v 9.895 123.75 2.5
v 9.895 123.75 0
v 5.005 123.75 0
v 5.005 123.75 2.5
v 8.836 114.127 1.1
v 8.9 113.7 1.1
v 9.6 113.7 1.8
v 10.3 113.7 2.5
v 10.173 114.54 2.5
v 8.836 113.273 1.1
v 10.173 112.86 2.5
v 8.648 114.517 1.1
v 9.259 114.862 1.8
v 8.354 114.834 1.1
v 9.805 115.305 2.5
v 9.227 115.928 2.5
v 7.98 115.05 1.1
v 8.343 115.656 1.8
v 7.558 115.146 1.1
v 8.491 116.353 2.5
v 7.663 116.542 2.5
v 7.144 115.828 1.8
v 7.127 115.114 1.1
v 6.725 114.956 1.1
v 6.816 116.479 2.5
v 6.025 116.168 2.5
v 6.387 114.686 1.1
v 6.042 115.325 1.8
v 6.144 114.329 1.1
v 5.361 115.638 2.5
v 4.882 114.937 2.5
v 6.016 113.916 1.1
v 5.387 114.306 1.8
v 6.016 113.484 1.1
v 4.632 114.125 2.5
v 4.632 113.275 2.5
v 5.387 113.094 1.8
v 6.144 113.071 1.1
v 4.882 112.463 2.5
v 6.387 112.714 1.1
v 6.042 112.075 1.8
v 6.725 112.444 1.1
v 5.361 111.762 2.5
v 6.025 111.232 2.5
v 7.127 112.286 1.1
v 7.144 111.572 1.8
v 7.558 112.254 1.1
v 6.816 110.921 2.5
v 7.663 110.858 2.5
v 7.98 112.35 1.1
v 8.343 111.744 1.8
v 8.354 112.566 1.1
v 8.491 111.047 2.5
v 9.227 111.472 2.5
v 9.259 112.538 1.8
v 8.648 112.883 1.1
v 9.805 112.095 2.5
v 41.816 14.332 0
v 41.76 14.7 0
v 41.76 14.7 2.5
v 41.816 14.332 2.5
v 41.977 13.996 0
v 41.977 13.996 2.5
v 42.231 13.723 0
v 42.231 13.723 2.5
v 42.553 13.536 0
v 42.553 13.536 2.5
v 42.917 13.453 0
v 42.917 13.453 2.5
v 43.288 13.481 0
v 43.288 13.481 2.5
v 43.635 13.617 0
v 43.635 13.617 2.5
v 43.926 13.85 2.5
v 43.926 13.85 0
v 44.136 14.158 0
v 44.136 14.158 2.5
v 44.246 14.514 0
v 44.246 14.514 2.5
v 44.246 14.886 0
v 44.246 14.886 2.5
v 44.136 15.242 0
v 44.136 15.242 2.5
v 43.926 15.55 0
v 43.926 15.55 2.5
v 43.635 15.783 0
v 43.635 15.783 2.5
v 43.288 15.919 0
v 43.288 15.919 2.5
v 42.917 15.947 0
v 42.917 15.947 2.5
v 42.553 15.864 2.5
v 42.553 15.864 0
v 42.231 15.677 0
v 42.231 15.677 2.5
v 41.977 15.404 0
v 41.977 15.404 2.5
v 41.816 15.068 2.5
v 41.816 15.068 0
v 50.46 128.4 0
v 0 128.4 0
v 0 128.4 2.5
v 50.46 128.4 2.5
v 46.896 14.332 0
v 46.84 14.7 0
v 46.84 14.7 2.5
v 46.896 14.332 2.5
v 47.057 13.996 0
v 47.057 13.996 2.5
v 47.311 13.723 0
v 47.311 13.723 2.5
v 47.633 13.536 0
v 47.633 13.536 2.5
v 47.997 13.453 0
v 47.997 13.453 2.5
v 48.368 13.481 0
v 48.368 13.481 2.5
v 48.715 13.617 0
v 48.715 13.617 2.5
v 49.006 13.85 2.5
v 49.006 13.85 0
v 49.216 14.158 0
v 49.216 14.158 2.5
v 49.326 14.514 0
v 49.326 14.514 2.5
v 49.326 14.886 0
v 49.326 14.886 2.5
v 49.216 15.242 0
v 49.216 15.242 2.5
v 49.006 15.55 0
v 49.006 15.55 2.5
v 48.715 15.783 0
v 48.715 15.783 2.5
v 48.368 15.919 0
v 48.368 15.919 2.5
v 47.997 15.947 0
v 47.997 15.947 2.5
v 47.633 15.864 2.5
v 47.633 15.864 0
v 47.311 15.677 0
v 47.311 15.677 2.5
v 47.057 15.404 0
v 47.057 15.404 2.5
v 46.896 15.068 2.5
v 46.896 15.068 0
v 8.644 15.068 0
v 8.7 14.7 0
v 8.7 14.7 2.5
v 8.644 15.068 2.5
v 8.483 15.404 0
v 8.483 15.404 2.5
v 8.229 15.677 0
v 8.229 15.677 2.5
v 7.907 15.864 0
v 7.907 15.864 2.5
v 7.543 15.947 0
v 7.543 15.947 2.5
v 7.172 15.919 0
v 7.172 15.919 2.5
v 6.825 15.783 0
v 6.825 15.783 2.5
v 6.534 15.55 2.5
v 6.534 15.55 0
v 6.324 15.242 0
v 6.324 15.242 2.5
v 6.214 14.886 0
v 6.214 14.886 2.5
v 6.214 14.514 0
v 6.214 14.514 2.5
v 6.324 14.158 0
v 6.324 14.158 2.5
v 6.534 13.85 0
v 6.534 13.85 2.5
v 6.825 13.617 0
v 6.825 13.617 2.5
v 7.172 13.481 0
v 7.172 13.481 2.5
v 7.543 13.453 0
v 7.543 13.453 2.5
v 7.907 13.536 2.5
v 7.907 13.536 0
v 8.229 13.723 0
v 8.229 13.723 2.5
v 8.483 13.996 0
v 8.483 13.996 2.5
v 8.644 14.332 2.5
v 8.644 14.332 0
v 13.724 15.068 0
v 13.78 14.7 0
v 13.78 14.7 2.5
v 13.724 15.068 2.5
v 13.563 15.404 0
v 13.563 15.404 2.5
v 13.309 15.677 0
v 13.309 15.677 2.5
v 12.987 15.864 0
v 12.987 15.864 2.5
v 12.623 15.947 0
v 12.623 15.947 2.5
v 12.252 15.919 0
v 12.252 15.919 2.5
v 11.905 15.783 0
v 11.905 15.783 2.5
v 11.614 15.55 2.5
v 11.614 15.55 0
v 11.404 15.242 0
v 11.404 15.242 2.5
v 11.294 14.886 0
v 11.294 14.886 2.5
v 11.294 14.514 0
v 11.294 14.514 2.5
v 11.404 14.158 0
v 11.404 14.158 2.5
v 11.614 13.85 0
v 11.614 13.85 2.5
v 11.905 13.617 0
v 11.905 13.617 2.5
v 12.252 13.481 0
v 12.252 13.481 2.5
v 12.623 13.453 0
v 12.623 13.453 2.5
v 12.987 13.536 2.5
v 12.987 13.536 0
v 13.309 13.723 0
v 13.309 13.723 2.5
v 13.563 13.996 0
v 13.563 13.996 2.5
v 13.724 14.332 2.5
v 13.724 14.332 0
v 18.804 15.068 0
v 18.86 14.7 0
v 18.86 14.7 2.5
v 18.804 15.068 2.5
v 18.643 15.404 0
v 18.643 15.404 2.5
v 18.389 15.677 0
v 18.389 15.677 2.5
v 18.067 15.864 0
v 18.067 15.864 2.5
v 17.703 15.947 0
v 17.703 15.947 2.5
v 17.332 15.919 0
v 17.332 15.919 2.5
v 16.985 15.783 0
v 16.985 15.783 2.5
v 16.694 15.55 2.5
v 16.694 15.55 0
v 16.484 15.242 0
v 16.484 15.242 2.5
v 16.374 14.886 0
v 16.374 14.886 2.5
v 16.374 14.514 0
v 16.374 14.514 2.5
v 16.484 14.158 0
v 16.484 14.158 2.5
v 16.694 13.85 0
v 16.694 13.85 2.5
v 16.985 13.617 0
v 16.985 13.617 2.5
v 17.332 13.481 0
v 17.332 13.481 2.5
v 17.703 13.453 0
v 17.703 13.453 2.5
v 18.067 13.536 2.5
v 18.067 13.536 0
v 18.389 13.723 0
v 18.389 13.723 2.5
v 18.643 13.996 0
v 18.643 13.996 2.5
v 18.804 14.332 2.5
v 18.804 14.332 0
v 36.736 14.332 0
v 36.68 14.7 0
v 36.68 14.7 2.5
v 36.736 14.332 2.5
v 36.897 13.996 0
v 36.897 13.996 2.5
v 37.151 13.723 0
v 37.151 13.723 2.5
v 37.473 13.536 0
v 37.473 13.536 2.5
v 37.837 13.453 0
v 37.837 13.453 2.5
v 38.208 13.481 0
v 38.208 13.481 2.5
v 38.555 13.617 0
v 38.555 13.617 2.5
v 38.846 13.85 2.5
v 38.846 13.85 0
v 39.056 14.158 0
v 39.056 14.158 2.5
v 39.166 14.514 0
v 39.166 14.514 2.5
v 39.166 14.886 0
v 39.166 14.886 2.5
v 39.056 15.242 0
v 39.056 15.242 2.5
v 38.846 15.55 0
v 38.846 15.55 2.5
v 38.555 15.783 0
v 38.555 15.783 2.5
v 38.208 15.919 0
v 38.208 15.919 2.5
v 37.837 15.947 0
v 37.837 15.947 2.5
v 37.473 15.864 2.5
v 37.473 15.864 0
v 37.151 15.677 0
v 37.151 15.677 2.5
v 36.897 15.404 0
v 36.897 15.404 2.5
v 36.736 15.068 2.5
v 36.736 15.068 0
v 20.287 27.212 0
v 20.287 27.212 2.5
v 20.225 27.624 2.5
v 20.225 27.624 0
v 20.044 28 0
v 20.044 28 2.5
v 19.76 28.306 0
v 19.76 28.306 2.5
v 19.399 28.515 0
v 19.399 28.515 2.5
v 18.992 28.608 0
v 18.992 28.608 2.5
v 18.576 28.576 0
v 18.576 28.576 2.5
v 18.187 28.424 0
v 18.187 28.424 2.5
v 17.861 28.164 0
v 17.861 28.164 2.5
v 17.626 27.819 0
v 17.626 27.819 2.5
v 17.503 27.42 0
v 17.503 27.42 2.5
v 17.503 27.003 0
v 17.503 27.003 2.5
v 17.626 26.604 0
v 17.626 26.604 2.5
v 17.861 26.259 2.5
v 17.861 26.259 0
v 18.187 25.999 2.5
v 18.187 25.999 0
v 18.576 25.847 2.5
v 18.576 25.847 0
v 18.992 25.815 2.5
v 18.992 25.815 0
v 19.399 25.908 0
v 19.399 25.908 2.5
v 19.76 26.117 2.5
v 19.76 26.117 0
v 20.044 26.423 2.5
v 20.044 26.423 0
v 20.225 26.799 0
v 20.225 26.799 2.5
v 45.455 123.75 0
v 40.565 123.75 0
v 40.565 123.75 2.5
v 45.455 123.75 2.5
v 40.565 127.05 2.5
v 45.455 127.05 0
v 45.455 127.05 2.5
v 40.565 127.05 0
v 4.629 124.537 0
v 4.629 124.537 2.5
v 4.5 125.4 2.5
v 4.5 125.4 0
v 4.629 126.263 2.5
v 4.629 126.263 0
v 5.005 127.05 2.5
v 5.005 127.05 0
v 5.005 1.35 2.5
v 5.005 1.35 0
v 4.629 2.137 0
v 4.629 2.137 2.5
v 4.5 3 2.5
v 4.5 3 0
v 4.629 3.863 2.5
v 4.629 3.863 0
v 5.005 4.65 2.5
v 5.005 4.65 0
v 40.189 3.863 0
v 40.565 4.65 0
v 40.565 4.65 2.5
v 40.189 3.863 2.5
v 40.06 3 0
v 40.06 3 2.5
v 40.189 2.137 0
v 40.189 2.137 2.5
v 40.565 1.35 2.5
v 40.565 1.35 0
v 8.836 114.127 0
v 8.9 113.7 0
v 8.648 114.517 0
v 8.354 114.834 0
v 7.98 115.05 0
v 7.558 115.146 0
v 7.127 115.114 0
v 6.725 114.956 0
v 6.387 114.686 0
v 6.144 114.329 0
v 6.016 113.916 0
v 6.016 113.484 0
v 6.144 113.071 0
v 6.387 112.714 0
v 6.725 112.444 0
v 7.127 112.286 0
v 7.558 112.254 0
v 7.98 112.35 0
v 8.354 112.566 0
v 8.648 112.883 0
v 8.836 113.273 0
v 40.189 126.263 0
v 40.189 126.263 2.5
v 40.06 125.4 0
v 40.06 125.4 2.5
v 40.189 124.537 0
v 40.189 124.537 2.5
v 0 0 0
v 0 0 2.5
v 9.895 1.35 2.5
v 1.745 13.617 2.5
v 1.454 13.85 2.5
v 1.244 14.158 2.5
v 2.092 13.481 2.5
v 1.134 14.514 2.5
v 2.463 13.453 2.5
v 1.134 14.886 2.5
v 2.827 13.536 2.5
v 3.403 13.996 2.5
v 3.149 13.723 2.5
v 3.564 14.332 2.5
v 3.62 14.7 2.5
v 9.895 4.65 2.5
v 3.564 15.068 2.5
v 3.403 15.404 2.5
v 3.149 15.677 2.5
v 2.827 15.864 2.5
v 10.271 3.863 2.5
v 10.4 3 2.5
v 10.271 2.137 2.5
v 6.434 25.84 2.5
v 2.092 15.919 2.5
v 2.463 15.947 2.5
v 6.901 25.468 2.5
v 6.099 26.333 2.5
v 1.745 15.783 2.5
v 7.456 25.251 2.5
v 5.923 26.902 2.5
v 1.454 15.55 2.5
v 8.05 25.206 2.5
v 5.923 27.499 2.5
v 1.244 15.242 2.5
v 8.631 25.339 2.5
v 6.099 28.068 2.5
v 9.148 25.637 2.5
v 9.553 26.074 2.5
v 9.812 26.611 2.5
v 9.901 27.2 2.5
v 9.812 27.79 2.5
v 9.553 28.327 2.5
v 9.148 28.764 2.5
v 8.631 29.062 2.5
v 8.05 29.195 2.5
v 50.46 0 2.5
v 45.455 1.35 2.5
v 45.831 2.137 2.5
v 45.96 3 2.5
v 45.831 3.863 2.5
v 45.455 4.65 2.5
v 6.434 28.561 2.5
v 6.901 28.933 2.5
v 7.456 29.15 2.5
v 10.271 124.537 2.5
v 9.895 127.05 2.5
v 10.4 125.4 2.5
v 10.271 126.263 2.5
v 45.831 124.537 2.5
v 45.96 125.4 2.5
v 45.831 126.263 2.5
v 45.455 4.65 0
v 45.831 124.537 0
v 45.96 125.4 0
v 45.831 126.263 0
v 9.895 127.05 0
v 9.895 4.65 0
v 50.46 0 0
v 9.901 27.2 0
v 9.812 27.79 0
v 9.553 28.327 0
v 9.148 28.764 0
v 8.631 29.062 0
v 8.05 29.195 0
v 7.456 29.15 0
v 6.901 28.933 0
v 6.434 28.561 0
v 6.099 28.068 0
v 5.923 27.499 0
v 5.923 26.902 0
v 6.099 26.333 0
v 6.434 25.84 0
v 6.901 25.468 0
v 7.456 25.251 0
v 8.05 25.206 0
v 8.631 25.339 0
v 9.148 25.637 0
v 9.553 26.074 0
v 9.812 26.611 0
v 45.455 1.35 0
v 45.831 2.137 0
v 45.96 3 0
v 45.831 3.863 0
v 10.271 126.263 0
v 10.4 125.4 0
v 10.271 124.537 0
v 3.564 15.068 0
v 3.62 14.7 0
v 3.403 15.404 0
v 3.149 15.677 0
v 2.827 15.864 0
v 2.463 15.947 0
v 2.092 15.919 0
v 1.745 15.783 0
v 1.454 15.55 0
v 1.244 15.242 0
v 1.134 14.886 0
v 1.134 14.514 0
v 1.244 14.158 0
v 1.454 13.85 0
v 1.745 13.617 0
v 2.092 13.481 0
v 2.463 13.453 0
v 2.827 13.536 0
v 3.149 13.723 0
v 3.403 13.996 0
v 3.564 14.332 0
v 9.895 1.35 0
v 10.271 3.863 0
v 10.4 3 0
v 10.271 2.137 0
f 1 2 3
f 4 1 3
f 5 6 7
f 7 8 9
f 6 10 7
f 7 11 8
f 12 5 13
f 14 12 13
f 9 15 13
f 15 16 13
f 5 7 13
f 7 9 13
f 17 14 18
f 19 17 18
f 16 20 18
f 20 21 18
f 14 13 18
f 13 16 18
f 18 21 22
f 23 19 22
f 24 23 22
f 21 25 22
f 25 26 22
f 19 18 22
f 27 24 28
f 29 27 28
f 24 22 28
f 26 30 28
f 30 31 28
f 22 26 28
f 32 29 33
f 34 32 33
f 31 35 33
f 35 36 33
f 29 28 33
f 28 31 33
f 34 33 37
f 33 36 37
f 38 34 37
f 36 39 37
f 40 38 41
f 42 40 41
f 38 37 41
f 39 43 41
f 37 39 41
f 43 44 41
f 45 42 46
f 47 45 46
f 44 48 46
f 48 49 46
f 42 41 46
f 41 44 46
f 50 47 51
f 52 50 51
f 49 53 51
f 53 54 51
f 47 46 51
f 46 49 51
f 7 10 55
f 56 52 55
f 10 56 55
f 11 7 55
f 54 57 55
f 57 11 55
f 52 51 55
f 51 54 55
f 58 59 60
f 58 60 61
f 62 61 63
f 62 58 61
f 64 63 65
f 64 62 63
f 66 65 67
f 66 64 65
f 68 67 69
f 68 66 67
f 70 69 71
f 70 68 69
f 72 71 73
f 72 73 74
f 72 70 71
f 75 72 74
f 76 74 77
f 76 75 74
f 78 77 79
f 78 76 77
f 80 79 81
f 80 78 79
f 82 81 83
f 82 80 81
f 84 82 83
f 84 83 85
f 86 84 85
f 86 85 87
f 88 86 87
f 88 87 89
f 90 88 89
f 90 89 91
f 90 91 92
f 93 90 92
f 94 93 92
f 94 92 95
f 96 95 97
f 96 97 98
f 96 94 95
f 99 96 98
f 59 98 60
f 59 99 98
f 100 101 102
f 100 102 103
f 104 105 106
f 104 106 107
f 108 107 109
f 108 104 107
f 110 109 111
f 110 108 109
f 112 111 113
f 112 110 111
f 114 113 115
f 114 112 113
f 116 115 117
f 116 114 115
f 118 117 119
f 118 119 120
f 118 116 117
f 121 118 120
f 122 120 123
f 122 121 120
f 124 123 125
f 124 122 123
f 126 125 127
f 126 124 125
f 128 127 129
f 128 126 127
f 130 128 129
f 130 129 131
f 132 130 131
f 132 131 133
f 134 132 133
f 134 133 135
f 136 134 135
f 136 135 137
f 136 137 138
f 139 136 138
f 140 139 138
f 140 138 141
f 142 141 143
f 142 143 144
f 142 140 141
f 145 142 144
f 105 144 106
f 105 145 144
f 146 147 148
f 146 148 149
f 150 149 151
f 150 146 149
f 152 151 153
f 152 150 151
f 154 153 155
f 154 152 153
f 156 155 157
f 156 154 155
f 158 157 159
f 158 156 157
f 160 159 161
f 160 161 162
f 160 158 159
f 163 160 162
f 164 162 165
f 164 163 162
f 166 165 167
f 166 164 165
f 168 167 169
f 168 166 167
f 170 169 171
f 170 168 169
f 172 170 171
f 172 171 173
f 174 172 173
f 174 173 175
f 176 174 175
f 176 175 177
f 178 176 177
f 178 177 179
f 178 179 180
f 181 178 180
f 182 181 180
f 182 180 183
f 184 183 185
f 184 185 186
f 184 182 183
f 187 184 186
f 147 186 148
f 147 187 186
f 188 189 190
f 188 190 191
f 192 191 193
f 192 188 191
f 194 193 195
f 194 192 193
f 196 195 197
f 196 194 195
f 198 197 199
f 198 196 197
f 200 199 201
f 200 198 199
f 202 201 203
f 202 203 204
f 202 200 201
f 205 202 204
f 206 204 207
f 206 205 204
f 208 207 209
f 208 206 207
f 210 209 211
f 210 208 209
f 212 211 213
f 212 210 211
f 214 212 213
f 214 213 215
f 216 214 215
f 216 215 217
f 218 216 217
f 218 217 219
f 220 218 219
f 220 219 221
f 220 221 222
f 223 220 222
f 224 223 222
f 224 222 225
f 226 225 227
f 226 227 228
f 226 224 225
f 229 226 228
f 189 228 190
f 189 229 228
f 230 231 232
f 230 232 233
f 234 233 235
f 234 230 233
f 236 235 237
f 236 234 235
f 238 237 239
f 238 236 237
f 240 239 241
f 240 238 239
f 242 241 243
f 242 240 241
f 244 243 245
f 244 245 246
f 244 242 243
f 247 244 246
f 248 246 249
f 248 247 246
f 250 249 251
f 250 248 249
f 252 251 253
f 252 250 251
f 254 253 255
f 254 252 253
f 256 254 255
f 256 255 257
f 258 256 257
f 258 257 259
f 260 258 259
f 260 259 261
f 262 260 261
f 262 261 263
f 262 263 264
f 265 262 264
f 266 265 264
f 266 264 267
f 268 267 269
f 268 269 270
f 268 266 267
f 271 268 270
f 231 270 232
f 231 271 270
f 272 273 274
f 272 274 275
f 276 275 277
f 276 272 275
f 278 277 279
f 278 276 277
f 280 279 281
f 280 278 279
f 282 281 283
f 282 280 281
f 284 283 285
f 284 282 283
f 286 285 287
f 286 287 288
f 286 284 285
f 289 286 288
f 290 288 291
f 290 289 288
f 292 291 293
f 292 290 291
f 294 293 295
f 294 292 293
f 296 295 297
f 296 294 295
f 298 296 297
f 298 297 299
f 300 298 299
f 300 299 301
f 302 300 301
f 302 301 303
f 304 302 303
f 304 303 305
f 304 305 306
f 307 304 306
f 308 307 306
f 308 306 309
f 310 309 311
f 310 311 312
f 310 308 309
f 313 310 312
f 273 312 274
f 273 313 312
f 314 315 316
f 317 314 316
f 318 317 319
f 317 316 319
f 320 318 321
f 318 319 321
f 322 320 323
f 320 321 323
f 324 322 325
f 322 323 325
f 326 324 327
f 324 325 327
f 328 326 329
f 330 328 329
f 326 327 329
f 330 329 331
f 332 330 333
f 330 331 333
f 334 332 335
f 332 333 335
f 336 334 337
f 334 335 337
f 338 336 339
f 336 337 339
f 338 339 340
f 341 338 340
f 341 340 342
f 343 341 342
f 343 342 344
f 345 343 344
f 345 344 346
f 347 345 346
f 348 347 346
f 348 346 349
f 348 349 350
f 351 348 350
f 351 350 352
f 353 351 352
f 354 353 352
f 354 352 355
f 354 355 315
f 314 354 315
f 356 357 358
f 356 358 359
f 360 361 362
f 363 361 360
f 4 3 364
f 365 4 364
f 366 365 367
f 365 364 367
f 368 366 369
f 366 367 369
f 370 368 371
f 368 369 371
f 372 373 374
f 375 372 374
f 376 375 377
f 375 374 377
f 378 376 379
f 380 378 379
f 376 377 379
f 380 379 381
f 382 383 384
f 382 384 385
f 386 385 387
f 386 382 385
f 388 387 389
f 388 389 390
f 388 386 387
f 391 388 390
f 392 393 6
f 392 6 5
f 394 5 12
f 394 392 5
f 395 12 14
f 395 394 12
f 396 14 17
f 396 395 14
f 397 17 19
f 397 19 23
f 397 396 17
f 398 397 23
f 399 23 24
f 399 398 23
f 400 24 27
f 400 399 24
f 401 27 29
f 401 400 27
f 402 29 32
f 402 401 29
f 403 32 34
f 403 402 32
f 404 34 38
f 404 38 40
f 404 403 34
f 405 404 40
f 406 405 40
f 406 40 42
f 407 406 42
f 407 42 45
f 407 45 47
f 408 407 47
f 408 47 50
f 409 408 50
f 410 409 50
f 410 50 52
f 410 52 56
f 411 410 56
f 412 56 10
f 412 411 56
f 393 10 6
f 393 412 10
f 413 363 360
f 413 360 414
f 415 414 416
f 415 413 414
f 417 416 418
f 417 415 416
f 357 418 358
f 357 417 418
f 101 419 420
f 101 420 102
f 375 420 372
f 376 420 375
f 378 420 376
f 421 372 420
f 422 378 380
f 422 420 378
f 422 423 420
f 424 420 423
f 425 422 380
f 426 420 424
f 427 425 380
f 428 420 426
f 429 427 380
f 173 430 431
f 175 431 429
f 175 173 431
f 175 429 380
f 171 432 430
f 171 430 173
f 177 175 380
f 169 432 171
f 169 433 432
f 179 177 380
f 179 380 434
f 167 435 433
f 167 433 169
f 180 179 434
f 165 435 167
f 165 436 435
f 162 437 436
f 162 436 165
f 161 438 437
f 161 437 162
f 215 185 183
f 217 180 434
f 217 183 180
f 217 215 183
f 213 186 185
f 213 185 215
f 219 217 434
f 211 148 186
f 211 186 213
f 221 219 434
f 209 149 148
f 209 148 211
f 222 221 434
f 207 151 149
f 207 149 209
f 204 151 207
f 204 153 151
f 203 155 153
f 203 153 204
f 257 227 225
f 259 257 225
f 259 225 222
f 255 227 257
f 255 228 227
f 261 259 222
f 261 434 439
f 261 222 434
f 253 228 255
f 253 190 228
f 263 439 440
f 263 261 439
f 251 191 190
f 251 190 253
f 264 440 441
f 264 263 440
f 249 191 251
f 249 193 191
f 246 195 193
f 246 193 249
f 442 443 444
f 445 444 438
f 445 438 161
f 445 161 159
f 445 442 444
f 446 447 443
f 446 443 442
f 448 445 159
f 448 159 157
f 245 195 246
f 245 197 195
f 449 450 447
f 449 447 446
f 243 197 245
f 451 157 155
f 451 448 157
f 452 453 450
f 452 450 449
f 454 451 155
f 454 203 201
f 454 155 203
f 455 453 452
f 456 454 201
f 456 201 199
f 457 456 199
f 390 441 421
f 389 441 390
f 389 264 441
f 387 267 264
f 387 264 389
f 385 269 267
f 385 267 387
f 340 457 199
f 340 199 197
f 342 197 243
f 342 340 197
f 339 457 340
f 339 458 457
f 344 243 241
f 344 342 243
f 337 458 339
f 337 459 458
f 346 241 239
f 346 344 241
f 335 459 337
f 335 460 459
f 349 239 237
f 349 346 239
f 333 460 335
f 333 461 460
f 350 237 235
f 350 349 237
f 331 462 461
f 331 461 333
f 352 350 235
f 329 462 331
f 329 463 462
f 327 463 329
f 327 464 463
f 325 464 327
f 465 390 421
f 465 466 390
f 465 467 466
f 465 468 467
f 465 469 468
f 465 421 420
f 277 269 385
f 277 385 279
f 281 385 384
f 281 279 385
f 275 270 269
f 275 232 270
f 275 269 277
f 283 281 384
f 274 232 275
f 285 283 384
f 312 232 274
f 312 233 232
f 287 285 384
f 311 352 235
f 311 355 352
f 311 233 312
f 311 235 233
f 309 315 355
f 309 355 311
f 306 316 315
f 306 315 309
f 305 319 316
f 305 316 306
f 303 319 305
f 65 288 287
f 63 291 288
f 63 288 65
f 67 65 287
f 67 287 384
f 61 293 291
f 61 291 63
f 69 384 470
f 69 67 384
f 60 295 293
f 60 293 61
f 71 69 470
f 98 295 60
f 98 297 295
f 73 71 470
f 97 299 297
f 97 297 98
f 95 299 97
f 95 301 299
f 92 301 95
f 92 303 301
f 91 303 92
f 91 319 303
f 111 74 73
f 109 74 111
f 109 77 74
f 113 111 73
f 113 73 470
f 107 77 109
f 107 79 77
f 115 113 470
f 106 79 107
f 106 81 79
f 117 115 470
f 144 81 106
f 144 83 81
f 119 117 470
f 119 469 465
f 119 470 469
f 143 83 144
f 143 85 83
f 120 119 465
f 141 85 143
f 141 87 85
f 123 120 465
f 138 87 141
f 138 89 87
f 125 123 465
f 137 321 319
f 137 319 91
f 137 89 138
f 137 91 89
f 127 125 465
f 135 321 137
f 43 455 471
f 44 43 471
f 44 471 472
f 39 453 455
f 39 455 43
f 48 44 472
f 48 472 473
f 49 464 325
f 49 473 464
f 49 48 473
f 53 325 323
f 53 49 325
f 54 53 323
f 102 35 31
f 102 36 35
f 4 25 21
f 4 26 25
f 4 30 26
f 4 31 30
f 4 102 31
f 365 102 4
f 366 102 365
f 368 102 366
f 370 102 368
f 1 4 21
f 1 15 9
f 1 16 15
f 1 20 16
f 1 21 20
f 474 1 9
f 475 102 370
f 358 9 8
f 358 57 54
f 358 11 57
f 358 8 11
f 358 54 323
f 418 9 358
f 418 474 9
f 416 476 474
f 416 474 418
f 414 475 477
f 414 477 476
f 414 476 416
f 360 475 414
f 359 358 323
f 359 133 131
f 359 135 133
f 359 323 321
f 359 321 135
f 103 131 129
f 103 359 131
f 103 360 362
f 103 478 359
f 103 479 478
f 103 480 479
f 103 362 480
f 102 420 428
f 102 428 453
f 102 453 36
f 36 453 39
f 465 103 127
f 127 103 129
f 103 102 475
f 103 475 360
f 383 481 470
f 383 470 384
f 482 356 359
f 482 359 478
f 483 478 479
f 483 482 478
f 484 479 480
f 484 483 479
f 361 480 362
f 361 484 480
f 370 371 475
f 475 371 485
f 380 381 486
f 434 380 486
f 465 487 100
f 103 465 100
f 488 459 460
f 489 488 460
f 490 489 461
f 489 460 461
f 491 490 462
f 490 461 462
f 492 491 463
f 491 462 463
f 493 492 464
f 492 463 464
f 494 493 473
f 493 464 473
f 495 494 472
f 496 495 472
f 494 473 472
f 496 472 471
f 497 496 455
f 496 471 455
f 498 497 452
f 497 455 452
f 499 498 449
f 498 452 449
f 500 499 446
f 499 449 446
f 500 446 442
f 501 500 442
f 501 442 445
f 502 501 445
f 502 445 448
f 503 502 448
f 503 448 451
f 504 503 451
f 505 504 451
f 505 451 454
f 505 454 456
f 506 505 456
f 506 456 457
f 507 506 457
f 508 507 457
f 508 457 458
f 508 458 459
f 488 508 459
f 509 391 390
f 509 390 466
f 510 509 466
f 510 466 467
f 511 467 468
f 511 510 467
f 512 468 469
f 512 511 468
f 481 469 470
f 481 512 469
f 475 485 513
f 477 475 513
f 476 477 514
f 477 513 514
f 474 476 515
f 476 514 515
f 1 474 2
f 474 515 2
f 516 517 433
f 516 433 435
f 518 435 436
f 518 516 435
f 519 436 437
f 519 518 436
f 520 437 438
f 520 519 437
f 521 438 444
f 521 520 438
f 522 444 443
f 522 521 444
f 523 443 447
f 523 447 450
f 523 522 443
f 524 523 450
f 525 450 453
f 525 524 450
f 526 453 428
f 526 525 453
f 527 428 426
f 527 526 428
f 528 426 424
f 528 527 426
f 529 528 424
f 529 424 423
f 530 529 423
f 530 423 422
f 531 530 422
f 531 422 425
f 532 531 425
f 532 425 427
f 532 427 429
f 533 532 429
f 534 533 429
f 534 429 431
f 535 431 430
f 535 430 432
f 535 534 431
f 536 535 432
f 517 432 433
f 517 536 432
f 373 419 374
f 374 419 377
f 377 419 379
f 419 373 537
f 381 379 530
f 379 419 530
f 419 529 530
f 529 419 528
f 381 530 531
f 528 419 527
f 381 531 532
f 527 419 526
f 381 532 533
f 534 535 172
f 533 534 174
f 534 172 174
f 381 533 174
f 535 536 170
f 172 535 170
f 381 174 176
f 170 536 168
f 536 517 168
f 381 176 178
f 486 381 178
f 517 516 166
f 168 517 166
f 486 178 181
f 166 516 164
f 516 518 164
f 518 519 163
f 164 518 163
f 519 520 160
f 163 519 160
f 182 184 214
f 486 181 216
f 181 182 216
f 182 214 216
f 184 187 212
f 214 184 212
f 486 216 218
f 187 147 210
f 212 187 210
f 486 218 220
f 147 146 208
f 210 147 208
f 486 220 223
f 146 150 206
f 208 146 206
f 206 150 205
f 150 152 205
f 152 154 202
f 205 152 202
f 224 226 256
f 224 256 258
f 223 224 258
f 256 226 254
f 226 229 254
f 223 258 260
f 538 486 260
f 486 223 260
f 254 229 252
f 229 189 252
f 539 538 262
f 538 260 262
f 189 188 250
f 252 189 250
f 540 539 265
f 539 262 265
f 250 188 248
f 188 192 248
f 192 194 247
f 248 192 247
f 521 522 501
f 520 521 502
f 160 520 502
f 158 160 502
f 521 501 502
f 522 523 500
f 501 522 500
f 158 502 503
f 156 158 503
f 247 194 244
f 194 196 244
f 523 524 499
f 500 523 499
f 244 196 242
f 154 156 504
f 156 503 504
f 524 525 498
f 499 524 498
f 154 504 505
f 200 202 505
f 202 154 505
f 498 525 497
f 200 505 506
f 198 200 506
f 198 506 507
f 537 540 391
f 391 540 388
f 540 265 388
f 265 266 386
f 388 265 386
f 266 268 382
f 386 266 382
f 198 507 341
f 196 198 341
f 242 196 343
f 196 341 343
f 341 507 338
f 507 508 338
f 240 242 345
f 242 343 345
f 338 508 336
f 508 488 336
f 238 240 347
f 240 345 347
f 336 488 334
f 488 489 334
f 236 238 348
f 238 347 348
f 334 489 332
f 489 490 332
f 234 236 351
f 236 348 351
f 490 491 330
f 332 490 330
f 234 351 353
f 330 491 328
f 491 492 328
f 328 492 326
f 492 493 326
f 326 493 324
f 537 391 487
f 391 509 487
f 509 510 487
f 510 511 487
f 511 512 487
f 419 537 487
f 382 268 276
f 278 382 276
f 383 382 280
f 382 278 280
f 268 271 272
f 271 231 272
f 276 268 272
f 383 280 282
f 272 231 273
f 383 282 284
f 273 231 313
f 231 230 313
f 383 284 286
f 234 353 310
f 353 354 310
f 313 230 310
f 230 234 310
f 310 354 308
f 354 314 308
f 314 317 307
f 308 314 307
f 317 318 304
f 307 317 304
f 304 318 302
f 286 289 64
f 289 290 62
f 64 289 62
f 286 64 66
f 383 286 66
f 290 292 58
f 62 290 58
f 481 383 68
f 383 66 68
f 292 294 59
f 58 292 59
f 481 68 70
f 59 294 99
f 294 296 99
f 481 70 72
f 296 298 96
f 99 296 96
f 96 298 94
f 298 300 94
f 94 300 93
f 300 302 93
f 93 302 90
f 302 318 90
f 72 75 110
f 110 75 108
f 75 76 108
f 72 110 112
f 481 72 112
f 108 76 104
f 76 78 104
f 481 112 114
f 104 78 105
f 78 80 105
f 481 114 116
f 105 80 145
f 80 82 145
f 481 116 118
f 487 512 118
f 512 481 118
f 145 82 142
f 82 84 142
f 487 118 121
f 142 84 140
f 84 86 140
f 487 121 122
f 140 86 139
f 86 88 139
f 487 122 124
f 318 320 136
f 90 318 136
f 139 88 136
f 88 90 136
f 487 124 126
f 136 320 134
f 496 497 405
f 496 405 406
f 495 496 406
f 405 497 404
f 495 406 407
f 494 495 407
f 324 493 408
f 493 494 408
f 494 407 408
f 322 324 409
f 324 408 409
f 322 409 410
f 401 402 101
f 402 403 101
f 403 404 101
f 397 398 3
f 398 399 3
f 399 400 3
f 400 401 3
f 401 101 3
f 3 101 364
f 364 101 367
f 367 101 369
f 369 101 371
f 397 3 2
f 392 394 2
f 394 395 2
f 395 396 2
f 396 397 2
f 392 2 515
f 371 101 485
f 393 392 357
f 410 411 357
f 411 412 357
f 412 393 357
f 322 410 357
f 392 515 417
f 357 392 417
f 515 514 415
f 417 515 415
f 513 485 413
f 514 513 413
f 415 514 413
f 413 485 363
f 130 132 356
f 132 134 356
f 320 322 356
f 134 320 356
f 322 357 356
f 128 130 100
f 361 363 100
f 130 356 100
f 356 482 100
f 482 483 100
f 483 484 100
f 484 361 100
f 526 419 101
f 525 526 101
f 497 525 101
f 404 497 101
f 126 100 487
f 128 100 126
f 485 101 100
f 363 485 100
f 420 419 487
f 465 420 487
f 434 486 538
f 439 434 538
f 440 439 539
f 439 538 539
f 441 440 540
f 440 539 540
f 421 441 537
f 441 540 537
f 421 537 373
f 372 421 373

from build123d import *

# Parameters (mm, degrees)
MODEL_W                 = 50.46
MODEL_H                 = 128.4
MODEL_R                 = 1.25
MODEL_R_2               = 1.45
BOSS_EXTRU_1_DEPTH      = 2.5
CHANFREIN1_SIZE         = 1.4
ESQUISSE1_R             = 1.4
ESQUISSE1_R_2           = 2
ENL_V_MAT_EXTRU_1_DEPTH = 138.98196114


with BuildPart() as part:
    # Model → Boss.-Extru.1 (new body)
    with BuildSketch(Plane.XY):
        with Locations((25.23, 64.2)):
            Rectangle(MODEL_W, MODEL_H)
        with Locations((2.37, 14.7)):
            Circle(MODEL_R, mode=Mode.SUBTRACT)
        with Locations((12.53, 14.7)):
            Circle(MODEL_R, mode=Mode.SUBTRACT)
        with Locations(Location((37.93, 14.7, 0), (0, 0, 180))):
            Circle(MODEL_R, mode=Mode.SUBTRACT)
        with Locations((7.45, 14.7)):
            Circle(MODEL_R, mode=Mode.SUBTRACT)
        with Locations((7.45, 113.7)):
            Circle(MODEL_R_2, mode=Mode.SUBTRACT)
        with Locations((17.61, 14.7)):
            Circle(MODEL_R, mode=Mode.SUBTRACT)
        with Locations(Location((43.01, 14.7, 0), (0, 0, 180))):
            Circle(MODEL_R, mode=Mode.SUBTRACT)
        with Locations(Location((48.09, 14.7, 0), (0, 0, 180))):
            Circle(MODEL_R, mode=Mode.SUBTRACT)
        with BuildLine():
            Line((9.895403852, 123.75), (5.004596148, 123.75))
            ThreePointArc((5.004596148, 123.75), (4.5, 125.4), (5.004596148, 127.05))
            Line((5.004596148, 127.05), (9.895403852, 127.05))
            ThreePointArc((9.895403852, 127.05), (10.4, 125.4), (9.895403852, 123.75))
        make_face(mode=Mode.SUBTRACT)
        with BuildLine():
            Line((9.895403852, 1.35), (5.004596148, 1.35))
            ThreePointArc((5.004596148, 1.35), (4.5, 3), (5.004596148, 4.65))
            Line((5.004596148, 4.65), (9.895403852, 4.65))
            ThreePointArc((9.895403852, 4.65), (10.4, 3), (9.895403852, 1.35))
        make_face(mode=Mode.SUBTRACT)
        with BuildLine():
            Line((40.564596148, 1.35), (45.455403852, 1.35))
            ThreePointArc((45.455403852, 1.35), (45.96, 3), (45.455403852, 4.65))
            Line((45.455403852, 4.65), (40.564596148, 4.65))
            ThreePointArc((40.564596148, 4.65), (40.06, 3), (40.564596148, 1.35))
        make_face(mode=Mode.SUBTRACT)
        with BuildLine():
            Line((40.564596148, 123.75), (45.455403852, 123.75))
            ThreePointArc((45.455403852, 123.75), (45.96, 125.4), (45.455403852, 127.05))
            Line((45.455403852, 127.05), (40.564596148, 127.05))
            ThreePointArc((40.564596148, 127.05), (40.06, 125.4), (40.564596148, 123.75))
        make_face(mode=Mode.SUBTRACT)
    extrude(amount=BOSS_EXTRU_1_DEPTH)

    # Chanfrein1
    chanfrein1_edges = [part.edges().sort_by_distance(p)[0] for p in [
        (6, 113.7, 2.5),
    ]]
    chamfer(chanfrein1_edges, length=CHANFREIN1_SIZE)

    # Esquisse1 → Enlèv. mat.-Extru.1 (cut, through all)
    with BuildSketch(Plane.XY.offset(2.5)):
        with Locations((18.887367925, 27.211559267)):
            Circle(ESQUISSE1_R)
        with Locations((7.900573508, 27.200461502)):
            Circle(ESQUISSE1_R_2)
    extrude(amount=-ENL_V_MAT_EXTRU_1_DEPTH, mode=Mode.SUBTRACT)


solid = part.part
